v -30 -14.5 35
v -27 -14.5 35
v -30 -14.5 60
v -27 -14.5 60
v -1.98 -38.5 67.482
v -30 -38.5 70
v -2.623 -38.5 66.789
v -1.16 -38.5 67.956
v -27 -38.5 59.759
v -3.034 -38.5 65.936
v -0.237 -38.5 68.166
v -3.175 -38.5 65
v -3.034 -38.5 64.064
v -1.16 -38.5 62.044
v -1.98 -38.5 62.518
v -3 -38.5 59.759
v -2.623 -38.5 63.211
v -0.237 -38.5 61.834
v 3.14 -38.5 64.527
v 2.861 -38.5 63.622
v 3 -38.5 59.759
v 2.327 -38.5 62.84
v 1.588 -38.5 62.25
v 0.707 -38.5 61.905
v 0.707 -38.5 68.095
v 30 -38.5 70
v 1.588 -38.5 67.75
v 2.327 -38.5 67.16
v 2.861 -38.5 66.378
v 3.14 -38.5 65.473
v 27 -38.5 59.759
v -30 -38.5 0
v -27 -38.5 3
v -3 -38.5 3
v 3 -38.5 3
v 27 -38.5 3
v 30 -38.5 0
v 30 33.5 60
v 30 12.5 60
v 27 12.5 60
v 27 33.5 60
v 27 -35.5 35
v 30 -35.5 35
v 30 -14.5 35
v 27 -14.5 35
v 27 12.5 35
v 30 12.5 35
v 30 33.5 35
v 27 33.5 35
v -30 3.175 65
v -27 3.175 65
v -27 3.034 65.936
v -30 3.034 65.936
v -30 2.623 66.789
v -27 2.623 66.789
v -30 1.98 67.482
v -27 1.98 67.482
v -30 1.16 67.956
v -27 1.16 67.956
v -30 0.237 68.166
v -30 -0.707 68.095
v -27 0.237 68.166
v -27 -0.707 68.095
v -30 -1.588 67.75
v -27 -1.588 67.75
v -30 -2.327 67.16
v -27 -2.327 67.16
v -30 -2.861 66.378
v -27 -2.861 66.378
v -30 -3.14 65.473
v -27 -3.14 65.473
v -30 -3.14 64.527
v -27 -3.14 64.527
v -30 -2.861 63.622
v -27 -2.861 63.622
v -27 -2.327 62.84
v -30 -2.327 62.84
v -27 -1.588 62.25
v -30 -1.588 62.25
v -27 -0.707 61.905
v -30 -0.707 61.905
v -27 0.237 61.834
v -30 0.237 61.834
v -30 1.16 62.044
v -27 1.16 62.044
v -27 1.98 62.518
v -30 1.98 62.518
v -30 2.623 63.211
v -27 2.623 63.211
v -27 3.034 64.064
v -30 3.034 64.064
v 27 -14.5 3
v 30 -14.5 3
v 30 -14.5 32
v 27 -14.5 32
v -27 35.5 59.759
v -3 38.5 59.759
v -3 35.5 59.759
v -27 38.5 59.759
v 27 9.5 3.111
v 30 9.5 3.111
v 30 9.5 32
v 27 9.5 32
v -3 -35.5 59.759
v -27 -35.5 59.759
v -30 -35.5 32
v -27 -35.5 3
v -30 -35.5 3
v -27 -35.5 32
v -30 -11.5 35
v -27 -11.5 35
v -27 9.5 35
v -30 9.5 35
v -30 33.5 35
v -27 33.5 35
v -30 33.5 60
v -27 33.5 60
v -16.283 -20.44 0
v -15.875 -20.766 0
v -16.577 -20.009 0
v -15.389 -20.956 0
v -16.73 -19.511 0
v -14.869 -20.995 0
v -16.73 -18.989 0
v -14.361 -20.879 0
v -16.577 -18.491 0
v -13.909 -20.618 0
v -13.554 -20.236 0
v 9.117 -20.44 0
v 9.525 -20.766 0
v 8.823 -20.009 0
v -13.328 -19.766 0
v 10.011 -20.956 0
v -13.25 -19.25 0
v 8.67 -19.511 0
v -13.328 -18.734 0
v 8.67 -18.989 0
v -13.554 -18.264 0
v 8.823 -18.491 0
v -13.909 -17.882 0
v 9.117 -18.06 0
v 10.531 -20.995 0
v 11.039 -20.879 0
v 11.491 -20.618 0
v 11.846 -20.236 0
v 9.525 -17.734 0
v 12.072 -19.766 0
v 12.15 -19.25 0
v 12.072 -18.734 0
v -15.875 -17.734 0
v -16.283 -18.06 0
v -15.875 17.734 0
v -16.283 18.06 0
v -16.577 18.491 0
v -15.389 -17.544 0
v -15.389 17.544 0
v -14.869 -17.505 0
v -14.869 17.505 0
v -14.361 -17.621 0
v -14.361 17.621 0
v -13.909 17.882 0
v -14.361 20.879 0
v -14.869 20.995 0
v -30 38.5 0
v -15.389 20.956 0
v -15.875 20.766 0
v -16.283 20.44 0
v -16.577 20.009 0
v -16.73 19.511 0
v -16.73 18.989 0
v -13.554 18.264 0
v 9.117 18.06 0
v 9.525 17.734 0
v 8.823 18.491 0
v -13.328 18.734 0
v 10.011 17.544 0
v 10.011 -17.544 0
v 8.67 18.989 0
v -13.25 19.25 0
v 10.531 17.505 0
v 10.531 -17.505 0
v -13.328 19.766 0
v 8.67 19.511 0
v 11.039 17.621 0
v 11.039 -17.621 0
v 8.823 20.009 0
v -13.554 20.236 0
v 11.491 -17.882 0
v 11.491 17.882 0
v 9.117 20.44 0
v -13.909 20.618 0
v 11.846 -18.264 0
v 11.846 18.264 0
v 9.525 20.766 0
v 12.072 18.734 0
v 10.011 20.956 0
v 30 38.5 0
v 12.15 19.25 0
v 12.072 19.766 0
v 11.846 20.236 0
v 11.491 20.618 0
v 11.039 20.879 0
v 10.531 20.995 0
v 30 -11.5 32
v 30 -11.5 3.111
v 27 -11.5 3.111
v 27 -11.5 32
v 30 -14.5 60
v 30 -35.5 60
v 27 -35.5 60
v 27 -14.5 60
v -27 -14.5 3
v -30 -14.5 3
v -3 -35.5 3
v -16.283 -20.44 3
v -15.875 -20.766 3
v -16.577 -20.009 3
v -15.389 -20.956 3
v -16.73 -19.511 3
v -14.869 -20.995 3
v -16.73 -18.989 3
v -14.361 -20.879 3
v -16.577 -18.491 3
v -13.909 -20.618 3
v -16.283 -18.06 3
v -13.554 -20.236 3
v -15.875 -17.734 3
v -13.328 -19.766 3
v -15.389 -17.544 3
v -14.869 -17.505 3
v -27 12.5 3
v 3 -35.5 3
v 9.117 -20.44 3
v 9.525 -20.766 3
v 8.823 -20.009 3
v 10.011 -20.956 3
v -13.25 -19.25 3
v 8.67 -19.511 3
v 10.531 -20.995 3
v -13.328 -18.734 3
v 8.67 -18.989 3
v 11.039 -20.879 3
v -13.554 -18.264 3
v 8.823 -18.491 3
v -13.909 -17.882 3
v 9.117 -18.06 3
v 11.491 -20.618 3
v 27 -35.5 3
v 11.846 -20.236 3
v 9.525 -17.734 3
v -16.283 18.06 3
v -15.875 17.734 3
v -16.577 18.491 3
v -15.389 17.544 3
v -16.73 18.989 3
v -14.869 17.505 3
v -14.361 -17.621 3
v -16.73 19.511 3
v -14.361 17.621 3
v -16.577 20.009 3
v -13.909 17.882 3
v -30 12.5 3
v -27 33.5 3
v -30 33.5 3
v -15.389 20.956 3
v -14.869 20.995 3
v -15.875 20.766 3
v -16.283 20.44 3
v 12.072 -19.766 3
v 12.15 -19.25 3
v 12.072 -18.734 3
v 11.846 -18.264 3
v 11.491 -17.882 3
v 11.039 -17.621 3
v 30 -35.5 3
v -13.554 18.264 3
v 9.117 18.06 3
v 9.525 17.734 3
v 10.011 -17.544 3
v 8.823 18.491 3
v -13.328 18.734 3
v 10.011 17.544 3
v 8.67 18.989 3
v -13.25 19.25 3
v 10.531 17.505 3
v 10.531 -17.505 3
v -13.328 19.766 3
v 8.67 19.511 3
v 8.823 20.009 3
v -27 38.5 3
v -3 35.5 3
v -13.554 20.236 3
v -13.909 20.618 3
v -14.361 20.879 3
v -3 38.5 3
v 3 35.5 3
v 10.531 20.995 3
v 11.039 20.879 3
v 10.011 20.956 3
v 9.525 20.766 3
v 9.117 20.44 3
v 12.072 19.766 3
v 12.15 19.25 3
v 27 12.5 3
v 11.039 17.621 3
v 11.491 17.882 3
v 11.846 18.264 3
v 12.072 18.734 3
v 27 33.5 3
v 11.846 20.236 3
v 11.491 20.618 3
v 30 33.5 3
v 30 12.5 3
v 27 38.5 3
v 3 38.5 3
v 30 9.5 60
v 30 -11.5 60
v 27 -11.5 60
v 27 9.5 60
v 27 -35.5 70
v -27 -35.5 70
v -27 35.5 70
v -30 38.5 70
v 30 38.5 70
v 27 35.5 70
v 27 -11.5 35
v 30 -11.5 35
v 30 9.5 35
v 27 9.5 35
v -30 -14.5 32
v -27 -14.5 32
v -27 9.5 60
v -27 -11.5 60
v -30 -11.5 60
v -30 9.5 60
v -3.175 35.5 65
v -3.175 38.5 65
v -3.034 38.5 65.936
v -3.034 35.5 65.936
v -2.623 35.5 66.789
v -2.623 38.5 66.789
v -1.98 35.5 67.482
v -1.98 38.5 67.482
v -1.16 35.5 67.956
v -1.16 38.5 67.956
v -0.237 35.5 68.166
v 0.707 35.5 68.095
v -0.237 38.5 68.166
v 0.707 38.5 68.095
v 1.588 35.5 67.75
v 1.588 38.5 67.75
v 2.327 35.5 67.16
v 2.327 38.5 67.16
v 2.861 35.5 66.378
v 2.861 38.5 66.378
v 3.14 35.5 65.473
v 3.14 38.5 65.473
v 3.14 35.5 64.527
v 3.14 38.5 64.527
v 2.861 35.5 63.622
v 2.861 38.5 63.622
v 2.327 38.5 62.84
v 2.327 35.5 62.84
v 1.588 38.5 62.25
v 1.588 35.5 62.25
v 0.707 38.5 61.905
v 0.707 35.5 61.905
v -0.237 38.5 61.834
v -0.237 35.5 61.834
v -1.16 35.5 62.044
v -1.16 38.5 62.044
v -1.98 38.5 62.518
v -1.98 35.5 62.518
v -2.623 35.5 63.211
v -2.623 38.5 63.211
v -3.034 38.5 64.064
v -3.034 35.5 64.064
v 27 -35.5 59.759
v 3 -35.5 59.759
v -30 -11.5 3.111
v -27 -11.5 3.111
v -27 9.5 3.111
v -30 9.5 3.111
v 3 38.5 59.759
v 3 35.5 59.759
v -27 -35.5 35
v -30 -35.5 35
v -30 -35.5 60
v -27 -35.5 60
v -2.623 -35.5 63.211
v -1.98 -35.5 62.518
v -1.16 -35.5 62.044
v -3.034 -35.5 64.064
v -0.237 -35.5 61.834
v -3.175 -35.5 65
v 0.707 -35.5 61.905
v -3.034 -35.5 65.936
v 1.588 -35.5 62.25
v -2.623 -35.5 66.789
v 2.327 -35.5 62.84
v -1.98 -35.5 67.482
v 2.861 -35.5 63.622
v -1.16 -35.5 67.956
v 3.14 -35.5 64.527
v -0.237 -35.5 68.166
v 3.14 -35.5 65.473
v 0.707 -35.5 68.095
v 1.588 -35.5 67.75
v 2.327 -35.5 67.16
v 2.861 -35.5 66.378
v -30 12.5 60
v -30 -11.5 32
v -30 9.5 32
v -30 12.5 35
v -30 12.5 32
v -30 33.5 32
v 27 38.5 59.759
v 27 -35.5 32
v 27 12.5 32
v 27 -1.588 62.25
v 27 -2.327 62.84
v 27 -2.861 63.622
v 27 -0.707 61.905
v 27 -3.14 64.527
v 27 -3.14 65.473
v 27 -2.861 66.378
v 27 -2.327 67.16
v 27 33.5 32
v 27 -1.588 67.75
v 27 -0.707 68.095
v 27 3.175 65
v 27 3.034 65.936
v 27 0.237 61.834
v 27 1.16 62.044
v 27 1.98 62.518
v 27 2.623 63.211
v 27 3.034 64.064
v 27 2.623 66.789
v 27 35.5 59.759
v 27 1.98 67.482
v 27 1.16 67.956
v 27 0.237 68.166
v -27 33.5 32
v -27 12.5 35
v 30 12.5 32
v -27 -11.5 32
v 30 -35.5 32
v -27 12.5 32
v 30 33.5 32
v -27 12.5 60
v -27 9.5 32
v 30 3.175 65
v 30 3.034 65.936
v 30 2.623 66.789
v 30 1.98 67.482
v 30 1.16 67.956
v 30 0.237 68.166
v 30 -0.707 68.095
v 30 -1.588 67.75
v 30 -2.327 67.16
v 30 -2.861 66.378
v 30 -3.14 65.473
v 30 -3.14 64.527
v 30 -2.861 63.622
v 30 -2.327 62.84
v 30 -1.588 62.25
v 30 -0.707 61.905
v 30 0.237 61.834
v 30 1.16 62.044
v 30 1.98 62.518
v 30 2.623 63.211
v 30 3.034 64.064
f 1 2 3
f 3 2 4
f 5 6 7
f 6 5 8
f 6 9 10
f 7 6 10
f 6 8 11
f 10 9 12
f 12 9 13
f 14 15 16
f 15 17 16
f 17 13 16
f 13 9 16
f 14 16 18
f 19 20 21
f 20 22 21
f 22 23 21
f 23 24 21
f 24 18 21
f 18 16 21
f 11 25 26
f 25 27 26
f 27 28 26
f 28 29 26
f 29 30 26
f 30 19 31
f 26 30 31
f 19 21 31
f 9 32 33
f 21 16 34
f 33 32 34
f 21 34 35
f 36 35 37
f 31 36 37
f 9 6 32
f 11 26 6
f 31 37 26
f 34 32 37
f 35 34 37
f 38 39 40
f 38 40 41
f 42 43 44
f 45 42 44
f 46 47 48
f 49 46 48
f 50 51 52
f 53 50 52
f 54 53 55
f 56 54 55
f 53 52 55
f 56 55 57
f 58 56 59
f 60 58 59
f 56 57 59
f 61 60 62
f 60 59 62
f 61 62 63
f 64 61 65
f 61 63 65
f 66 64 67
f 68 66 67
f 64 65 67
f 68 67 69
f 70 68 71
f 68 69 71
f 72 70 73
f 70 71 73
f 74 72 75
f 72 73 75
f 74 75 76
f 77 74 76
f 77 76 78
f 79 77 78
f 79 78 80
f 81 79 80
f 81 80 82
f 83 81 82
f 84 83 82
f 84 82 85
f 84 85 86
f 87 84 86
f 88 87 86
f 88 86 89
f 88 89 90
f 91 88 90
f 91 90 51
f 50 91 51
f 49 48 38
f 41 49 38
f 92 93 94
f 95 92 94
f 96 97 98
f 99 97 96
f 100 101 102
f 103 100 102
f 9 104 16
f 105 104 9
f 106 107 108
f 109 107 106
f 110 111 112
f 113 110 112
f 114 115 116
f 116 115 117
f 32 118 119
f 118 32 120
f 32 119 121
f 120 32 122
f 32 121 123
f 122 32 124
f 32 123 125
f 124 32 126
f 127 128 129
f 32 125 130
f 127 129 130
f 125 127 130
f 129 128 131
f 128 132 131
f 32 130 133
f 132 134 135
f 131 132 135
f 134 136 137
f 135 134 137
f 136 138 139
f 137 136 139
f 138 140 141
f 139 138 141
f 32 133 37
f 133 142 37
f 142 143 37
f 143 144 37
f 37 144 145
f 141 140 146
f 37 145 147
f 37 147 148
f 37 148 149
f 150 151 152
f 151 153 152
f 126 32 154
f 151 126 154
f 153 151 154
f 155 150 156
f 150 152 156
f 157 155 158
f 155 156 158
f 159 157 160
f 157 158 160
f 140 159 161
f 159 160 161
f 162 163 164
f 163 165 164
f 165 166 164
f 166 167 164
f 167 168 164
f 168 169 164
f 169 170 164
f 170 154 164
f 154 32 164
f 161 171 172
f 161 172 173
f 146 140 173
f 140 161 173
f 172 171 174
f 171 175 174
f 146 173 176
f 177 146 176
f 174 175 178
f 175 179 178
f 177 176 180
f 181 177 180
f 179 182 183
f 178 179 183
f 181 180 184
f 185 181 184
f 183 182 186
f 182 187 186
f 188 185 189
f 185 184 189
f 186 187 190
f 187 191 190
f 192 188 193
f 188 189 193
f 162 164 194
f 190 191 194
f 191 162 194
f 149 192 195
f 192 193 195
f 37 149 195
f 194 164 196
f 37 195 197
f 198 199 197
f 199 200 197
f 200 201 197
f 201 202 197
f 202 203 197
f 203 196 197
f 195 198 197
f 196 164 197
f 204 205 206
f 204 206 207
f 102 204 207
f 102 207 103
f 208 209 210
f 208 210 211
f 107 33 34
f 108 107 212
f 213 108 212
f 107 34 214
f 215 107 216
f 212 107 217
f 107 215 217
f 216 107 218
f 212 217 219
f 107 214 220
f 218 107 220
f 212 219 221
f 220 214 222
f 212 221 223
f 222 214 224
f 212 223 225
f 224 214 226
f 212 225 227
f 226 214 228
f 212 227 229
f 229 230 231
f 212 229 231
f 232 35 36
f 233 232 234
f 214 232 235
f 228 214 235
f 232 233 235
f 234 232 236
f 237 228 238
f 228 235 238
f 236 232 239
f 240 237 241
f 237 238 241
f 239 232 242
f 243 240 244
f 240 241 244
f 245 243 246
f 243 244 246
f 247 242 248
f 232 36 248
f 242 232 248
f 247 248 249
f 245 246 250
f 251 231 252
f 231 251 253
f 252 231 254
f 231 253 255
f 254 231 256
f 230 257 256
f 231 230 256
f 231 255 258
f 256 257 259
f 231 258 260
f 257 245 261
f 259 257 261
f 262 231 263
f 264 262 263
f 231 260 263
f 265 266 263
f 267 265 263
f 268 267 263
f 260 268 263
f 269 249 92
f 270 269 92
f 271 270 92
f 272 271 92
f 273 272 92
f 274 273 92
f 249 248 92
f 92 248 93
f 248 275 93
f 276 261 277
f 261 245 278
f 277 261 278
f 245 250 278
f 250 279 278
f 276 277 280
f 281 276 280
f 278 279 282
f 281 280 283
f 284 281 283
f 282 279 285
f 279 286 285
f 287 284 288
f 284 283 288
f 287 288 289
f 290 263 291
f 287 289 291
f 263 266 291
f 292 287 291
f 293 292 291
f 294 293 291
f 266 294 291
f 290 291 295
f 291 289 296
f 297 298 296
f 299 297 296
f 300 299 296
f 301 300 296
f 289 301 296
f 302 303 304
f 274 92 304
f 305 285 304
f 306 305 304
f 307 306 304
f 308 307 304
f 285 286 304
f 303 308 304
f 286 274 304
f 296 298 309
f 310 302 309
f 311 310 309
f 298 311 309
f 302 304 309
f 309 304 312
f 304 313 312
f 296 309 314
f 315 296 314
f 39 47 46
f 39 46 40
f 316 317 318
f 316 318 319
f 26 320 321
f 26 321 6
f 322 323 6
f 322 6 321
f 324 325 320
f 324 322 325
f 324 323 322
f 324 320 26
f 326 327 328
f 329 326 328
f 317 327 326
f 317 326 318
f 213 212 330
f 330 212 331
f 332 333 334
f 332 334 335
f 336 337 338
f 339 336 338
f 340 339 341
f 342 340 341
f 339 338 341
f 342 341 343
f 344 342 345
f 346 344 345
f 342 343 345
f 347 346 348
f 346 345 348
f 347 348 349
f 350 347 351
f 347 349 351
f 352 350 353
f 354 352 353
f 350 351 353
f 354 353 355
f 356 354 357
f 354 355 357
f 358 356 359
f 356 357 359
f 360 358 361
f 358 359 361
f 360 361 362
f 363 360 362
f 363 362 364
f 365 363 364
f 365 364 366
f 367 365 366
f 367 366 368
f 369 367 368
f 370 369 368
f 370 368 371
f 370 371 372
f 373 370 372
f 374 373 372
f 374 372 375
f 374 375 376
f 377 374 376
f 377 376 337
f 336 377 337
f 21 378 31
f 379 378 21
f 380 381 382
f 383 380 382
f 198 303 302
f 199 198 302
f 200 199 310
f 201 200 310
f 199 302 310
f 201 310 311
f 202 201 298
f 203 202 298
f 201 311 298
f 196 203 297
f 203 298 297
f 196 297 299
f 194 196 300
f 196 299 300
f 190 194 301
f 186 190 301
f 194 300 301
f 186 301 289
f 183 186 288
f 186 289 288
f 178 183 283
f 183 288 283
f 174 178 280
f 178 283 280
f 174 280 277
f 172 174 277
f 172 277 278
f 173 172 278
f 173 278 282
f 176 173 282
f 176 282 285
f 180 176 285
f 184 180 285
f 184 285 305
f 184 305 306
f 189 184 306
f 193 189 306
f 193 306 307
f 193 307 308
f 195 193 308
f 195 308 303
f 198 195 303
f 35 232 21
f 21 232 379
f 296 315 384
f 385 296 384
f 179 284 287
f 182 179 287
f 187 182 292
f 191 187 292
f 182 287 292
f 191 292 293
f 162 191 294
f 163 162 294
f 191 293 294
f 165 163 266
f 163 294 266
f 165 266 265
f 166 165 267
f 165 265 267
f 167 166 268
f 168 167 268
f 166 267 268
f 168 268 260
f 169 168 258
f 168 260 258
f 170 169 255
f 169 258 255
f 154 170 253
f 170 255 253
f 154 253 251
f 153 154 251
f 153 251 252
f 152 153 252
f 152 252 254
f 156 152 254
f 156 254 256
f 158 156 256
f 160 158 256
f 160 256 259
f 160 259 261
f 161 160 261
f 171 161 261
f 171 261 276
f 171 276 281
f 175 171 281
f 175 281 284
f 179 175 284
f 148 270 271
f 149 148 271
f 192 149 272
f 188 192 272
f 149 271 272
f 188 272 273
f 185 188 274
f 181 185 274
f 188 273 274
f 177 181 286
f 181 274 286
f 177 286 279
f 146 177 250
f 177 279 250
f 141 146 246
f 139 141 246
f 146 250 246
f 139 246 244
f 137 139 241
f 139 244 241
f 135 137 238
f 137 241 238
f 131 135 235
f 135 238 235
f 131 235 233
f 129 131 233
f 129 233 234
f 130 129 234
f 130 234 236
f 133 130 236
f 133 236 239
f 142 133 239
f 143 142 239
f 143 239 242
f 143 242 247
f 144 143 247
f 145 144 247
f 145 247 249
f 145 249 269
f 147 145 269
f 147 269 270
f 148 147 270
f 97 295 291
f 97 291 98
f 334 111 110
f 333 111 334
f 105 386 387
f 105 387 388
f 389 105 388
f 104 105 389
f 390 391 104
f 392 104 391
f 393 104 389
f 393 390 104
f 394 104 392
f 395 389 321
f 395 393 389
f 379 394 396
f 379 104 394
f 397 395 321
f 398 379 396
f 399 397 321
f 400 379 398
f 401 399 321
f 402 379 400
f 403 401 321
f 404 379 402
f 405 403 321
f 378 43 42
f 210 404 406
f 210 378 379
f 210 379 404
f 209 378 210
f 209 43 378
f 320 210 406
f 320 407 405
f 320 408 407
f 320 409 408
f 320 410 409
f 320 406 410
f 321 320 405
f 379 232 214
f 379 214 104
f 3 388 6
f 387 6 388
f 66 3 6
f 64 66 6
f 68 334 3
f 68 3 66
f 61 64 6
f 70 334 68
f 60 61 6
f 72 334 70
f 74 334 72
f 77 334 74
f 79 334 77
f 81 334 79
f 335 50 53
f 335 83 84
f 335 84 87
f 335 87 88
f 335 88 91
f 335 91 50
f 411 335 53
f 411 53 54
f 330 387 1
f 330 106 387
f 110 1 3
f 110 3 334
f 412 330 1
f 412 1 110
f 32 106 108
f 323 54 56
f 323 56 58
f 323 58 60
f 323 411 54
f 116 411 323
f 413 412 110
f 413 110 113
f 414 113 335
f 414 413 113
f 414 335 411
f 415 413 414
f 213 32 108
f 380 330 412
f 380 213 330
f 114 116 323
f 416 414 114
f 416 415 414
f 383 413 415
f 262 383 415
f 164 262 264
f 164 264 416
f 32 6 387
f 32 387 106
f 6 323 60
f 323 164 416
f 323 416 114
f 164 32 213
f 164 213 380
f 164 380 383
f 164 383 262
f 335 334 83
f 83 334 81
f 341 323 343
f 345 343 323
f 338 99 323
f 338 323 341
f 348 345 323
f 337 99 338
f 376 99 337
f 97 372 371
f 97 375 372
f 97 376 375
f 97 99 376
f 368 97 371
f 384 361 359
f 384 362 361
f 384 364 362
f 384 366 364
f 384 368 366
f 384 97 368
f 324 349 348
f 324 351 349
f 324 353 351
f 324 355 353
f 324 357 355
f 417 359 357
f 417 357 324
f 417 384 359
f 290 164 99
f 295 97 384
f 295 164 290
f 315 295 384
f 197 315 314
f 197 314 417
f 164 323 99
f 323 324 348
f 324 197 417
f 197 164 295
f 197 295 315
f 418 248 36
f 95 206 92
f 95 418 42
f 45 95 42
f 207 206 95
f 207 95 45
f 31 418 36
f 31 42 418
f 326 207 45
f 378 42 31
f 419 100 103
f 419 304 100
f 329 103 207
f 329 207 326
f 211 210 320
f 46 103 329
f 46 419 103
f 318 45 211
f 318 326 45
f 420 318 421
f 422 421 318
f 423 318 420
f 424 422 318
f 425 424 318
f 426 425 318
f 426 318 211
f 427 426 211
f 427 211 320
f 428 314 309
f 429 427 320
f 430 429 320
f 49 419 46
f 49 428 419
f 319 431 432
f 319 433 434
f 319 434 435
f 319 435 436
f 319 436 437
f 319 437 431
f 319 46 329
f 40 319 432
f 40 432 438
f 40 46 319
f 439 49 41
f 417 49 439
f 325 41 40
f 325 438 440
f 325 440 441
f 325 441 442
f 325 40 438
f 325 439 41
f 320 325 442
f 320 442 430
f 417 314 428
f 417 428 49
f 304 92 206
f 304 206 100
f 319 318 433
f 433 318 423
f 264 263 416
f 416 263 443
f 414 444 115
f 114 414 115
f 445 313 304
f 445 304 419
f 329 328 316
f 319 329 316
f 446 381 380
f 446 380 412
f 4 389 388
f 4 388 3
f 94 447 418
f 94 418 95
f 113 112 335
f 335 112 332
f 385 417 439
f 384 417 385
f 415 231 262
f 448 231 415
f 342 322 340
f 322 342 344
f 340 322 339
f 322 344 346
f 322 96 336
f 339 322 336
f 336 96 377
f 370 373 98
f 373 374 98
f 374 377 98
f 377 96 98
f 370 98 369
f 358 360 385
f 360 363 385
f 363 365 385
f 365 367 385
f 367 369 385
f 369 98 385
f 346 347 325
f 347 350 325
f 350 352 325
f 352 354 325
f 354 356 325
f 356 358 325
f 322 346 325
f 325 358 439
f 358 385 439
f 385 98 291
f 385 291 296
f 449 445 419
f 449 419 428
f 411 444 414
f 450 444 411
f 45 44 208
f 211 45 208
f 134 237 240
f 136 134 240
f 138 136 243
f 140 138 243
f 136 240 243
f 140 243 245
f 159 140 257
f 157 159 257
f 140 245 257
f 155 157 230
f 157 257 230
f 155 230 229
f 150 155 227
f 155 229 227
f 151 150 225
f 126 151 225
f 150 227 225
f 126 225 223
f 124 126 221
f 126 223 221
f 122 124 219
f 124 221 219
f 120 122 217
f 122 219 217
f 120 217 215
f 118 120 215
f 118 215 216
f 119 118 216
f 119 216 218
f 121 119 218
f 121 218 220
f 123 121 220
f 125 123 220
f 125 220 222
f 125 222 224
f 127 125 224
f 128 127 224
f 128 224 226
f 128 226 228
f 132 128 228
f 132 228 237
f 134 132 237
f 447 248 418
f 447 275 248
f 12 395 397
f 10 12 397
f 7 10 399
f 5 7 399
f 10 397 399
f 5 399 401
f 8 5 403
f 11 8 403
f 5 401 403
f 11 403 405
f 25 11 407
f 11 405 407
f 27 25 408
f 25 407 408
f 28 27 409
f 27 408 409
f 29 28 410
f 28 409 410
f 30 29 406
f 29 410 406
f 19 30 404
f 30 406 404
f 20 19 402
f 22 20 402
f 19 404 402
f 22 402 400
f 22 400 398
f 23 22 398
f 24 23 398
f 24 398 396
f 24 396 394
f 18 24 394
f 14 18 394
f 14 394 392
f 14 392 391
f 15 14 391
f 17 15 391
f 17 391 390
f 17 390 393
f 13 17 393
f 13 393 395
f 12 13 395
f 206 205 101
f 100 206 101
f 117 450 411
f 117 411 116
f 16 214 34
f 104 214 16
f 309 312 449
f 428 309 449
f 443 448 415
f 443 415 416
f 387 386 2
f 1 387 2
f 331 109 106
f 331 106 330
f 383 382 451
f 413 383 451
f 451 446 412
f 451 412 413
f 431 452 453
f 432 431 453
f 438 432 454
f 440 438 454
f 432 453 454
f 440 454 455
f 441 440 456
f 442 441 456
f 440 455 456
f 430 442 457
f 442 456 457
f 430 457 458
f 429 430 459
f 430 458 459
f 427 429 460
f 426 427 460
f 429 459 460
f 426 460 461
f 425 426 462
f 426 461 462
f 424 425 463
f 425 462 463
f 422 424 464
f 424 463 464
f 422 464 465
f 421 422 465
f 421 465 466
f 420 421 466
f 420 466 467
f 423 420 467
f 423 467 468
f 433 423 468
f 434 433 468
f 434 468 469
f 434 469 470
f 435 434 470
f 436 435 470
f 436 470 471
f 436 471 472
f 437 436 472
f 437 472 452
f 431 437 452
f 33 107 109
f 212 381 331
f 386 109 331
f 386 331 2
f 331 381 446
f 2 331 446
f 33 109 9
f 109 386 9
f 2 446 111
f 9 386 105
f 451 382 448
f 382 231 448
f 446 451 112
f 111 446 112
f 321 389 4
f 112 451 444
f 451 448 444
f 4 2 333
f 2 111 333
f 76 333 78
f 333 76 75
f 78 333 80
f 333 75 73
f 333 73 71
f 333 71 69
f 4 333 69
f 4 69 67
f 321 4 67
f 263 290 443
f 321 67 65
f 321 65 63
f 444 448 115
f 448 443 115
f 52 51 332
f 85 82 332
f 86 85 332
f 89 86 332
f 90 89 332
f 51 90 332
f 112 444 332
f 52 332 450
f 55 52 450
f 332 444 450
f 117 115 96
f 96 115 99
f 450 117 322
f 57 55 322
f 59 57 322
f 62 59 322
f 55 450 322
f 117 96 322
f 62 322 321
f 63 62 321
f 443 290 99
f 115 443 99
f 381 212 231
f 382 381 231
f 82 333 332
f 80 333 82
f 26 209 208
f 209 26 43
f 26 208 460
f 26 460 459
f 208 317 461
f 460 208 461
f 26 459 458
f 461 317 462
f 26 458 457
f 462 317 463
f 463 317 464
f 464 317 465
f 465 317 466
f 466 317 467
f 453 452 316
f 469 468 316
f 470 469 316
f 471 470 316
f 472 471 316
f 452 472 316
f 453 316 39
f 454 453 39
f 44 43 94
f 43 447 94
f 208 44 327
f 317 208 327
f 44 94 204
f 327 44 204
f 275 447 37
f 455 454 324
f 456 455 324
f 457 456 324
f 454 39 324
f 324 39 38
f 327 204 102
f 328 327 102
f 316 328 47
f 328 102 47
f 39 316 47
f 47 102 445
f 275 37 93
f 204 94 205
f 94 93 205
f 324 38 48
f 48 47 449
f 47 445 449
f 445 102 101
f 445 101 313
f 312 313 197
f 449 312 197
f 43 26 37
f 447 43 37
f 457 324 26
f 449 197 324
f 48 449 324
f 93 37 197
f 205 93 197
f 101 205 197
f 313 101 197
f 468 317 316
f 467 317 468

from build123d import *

# Parameters (mm, degrees)
F0_W      = 60
F0_H      = 77
F1_DEPTH  = 70
F2_T      = -3
F3_W      = 21
F3_H      = 25
F3_H_2    = 29
F3_H_3    = 28.8890717719
F4_DEPTH  = 60.001
F5_R      = 1.75
F6_DEPTH  = 3.001
F3_R      = 3.175
F7_DEPTH  = 60.001
F8_R      = 3.175
F8_W      = 24
F8_H      = 56.7587303836
F9_DEPTH  = 77.001
F10_DEPTH = 77.001


# Not quite as in the source:
# - a feature names something its author has since deleted; it is built from what else it names


with BuildPart() as f1:
    # F0 (on Top) → F1 (new body)
    with BuildSketch(Plane.XY):
        Rectangle(F0_W, F0_H)
    extrude(amount=F1_DEPTH)

    # F2
    f2_openings = [f1.faces().sort_by_distance(p)[0] for p in [
        (0, 0, 70),
    ]]
    offset(amount=F2_T, openings=f2_openings)

    # F3 (on face) → F4 (cut, through all)
    with BuildSketch(Plane.YZ.offset(30)):
        with Locations((-25, 47.5)):
            Rectangle(F3_W, F3_H)
        with Locations((-1, 47.5)):
            Rectangle(F3_W, F3_H)
        with Locations((23, 47.5)):
            Rectangle(F3_W, F3_H)
        with Locations((-25, 17.5)):
            Rectangle(F3_W, F3_H_2)
        with Locations((-1, 17.5554641141)):
            Rectangle(F3_W, F3_H_3)
        with Locations((23, 17.5)):
            Rectangle(F3_W, F3_H_2)
    extrude(amount=-F4_DEPTH, mode=Mode.SUBTRACT)

    # F5 (on face) → F6 (cut, through all)
    with BuildSketch(Plane.XY.offset(3)):
        with Locations((-15, -19.25)):
            Circle(F5_R)
        with Locations((10.4, -19.25)):
            Circle(F5_R)
        with Locations((-15, 19.25)):
            Circle(F5_R)
        with Locations((10.4, 19.25)):
            Circle(F5_R)
    extrude(amount=-F6_DEPTH, mode=Mode.SUBTRACT)

    # F3 (on face) → F7 (cut, through all)
    with BuildSketch(Plane.YZ.offset(30)):
        with Locations((0, 65)):
            Circle(F3_R)
    extrude(amount=-F7_DEPTH, mode=Mode.SUBTRACT)

    # F8 (on face) → F9 (cut, through all)
    with BuildSketch(Plane(origin=(0, 38.5, 0), x_dir=(-1, 0, 0), z_dir=(0, 1, 0))):
        with Locations((0, 65)):
            Circle(F8_R)
        with Locations((-15, 31.3793651918)):
            Rectangle(F8_W, F8_H)
        with Locations((15, 31.3793651918)):
            Rectangle(F8_W, F8_H)
    extrude(amount=-F9_DEPTH, mode=Mode.SUBTRACT)

    # F8 (on face) → F10 (cut, through all)
    with BuildSketch(Plane(origin=(0, 38.5, 0), x_dir=(-1, 0, 0), z_dir=(0, 1, 0))):
        with Locations((0, 65)):
            Circle(F8_R)
        with Locations((-15, 31.3793651918)):
            Rectangle(F8_W, F8_H)
        with Locations((15, 31.3793651918)):
            Rectangle(F8_W, F8_H)
    extrude(amount=-F10_DEPTH, mode=Mode.SUBTRACT)


solid = f1.part
